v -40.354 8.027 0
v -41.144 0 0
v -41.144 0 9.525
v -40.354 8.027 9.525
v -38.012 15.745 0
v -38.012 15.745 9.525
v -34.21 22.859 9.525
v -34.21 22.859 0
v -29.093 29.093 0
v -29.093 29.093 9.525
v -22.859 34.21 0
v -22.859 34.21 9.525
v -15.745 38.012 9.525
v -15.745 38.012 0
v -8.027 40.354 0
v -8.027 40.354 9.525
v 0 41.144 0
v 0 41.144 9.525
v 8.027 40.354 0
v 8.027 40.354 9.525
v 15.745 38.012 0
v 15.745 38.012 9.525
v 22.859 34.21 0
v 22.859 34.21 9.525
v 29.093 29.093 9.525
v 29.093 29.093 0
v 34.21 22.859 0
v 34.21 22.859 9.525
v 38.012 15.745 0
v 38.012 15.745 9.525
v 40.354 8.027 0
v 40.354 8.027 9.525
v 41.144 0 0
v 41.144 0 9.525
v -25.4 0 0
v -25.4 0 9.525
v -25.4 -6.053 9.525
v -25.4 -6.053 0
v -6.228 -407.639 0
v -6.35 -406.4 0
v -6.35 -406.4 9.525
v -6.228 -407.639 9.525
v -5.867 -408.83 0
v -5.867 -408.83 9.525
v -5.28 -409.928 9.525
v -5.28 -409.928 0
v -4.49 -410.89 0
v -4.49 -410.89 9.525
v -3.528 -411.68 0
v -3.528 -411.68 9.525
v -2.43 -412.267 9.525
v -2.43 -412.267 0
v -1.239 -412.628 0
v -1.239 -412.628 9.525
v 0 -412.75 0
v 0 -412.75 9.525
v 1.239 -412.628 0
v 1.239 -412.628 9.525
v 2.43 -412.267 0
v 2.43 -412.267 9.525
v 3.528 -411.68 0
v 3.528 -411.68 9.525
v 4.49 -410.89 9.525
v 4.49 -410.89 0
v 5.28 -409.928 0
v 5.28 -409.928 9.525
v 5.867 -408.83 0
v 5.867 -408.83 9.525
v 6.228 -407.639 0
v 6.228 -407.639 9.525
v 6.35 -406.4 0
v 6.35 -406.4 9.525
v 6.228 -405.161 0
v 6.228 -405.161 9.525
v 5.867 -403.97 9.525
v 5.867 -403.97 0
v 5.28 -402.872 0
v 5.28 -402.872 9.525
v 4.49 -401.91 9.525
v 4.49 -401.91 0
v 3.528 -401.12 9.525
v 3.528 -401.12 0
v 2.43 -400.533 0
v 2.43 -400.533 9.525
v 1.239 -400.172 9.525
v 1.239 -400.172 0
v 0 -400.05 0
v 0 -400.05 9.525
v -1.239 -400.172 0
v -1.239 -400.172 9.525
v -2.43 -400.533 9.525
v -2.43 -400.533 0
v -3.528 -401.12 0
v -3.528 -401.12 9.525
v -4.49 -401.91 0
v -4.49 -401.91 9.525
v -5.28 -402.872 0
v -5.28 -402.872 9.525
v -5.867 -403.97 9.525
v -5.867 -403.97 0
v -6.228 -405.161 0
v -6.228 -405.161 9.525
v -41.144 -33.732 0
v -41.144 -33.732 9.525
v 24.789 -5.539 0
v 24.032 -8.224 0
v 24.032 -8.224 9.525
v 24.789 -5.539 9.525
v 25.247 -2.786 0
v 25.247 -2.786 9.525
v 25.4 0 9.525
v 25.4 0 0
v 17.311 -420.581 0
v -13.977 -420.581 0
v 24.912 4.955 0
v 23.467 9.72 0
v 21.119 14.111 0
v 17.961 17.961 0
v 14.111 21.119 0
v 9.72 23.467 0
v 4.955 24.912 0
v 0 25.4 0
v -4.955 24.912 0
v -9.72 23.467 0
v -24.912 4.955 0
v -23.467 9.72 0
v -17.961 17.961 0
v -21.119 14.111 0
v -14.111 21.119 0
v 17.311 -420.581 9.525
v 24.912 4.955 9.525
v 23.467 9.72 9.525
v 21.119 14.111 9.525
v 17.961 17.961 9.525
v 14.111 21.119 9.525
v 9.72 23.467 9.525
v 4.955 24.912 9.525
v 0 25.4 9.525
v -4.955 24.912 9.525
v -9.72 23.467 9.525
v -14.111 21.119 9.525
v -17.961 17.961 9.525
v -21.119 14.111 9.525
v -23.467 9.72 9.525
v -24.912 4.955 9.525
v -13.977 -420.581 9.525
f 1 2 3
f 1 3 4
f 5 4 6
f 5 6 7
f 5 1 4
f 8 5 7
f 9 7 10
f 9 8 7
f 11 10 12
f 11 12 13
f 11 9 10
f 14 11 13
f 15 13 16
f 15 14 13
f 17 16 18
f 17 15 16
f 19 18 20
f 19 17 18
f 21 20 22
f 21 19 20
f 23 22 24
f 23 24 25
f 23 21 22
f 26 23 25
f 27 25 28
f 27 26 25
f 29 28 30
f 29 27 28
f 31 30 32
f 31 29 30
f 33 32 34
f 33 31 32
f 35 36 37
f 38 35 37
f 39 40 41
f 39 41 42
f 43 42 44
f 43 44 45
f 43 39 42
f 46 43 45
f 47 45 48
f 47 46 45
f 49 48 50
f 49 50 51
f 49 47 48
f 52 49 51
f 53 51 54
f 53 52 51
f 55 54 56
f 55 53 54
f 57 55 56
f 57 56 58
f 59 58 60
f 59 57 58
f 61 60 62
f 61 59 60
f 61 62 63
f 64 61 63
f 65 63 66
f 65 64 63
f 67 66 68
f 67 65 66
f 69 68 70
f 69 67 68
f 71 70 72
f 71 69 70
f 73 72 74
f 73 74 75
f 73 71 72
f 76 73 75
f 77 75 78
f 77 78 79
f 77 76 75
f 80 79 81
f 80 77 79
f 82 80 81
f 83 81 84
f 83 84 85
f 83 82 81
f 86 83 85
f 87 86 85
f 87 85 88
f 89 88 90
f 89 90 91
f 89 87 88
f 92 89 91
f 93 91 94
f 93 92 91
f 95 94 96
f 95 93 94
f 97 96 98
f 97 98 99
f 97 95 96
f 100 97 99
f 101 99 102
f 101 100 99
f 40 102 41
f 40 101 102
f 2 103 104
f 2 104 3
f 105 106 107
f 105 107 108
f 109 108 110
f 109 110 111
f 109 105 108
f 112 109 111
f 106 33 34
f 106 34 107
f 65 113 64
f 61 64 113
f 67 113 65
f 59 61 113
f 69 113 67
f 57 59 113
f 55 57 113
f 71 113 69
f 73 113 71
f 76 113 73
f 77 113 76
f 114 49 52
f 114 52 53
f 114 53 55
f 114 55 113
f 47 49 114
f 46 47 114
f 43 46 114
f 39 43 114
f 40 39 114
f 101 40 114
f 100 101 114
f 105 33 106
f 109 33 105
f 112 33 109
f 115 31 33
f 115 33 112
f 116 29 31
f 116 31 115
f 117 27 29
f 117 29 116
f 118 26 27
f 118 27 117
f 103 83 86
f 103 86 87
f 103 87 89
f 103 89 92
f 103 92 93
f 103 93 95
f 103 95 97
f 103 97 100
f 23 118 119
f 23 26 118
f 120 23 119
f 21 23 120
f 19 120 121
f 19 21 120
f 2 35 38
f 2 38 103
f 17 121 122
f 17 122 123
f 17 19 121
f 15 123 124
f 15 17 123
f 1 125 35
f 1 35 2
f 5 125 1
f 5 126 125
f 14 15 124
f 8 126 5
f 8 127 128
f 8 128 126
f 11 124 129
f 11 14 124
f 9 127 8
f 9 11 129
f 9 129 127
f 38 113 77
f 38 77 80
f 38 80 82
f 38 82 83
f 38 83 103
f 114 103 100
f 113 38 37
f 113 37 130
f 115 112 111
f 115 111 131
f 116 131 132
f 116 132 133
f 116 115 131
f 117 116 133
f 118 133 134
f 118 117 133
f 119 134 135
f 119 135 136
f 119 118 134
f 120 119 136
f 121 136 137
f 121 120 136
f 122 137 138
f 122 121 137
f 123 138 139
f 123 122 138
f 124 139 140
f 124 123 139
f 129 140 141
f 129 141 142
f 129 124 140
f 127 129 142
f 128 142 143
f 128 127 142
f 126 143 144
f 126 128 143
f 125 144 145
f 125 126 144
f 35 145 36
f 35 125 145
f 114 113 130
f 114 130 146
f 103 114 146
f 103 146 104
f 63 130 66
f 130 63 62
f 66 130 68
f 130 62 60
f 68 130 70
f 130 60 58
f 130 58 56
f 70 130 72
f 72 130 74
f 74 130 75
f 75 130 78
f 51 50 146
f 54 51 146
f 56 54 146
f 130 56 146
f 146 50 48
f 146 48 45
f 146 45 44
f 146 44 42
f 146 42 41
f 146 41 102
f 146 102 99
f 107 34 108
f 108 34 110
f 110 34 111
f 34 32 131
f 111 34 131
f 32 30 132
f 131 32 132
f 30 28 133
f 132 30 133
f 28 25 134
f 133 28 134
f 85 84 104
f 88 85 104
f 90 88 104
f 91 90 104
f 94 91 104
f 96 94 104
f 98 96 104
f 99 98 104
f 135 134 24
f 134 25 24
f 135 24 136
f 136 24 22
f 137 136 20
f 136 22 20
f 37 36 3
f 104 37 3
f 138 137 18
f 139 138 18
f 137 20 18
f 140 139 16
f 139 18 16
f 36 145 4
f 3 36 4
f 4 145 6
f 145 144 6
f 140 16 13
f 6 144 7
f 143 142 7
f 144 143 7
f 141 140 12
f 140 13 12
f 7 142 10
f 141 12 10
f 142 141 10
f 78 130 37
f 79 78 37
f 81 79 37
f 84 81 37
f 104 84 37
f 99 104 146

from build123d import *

# Parameters (mm, degrees)
SKETCH1_R           = 6.35
BOSS_EXTRUDE1_DEPTH = 9.525


with BuildPart() as part:
    # Sketch1 → Boss-Extrude1 (new body)
    with BuildSketch(Plane.XY):
        with BuildLine():
            Line((-25.4, 0), (-25.4, -6.052924625))
            Line((-25.4, -6.052924625), (17.310584604, -420.580806397))
            Line((17.310584604, -420.580806397), (-13.977037286, -420.580806397))
            Line((-13.977037286, -420.580806397), (-41.144220181, -33.731534677))
            Line((-41.144220181, -33.731534677), (-41.144220181, 0))
            ThreePointArc((-41.144220181, 0), (0, 41.144220181), (41.144220181, 0))
            Line((41.144220181, 0), (24.031627115, -8.224408685))
            ThreePointArc((24.031627115, -8.224408685), (25.055571523, -4.168733098), (25.4, 0))
            ThreePointArc((25.4, 0), (0, 25.4), (-25.4, 0))
        make_face()
        with Locations(Location((0, -406.4, 0), (0, 0, 180))):
            Circle(SKETCH1_R, mode=Mode.SUBTRACT)
    extrude(amount=BOSS_EXTRUDE1_DEPTH)


solid = part.part
